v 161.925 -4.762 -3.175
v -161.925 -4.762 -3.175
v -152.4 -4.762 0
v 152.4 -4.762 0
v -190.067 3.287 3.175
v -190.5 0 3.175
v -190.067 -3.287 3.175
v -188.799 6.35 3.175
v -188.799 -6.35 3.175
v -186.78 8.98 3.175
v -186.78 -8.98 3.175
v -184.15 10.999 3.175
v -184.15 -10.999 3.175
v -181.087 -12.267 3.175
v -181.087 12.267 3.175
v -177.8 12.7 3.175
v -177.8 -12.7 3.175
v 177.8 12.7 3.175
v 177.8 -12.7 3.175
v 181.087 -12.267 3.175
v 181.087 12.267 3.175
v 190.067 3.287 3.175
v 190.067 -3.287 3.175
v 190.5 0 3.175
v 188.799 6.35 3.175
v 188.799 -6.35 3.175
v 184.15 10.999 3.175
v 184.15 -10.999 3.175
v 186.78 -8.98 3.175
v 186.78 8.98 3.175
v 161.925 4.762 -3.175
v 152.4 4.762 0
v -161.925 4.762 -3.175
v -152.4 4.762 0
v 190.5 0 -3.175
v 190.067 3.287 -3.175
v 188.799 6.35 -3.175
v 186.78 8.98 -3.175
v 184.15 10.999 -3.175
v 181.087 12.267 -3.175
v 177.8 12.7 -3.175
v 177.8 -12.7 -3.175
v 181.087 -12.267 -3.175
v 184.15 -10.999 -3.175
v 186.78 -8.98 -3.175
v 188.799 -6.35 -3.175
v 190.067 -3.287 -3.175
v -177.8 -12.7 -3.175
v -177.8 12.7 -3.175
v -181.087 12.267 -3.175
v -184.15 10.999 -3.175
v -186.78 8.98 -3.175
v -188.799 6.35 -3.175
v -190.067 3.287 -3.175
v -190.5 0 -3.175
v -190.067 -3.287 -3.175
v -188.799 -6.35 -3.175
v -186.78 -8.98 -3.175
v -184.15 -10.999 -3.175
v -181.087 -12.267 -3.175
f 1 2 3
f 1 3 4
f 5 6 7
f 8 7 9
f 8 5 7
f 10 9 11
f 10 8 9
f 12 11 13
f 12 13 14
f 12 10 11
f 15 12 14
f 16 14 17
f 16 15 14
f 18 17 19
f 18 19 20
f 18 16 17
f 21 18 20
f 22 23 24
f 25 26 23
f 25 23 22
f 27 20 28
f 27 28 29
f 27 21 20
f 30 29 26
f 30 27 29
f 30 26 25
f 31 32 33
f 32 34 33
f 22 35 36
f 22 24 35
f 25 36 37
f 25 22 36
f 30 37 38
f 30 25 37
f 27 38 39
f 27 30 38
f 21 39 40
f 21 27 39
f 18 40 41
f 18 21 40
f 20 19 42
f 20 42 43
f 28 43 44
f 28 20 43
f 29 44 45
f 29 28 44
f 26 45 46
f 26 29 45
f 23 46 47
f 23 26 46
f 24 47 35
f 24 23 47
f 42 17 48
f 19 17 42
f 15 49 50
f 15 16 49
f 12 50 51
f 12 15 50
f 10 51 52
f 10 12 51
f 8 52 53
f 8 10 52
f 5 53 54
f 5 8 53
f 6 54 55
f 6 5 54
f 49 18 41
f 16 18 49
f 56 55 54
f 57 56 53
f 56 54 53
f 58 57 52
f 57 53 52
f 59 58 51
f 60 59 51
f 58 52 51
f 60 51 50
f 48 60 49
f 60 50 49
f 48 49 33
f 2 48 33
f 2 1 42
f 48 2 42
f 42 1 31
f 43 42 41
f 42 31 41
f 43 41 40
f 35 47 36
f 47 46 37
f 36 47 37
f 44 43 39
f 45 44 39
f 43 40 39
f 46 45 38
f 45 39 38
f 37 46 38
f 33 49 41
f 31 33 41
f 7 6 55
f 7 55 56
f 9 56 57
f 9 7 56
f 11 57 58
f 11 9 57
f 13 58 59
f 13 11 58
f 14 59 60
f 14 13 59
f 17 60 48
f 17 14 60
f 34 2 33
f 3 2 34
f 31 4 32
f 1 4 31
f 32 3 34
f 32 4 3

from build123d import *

# Parameters (mm, degrees)
F1_DEPTH = 3.175
F2_W     = 9.525
F2_H     = 3.175
F3_DEPTH = 152.4
F5_DEPTH = 9.525


# Not quite as in the source:
# - a length typed as a fraction of an inch, garbled in the dataset ("3 / 203.2 mm" for 3/8 in), is restored
# - a feature names something its author has since deleted; it is built from what else it names


with BuildPart() as f1:
    # F0 (on Top) → F1 (new body, symmetric)
    with BuildSketch(Plane.XY):
        with BuildLine():
            Line((-152.4, 12.7), (-177.8, 12.7))
            ThreePointArc((-177.8, 12.7), (-186.780256, 8.980256), (-190.5, 0))
            ThreePointArc((-190.5, 0), (-186.780256, -8.980256), (-177.8, -12.7))
            Line((-177.8, -12.7), (-152.4, -12.7))
            Line((-152.4, -12.7), (152.4, -12.7))
            Line((152.4, -12.7), (177.8, -12.7))
            ThreePointArc((177.8, -12.7), (186.780256, -8.980256), (190.5, 0))
            ThreePointArc((190.5, 0), (186.780256, 8.980256), (177.8, 12.7))
            Line((177.8, 12.7), (152.4, 12.7))
            Line((152.4, 12.7), (-152.4, 12.7))
        make_face()
    extrude(amount=F1_DEPTH, both=True)

    # F2 (on Right) → F3 (cut, symmetric)
    with BuildSketch(Plane.YZ):
        with Locations((0, -1.5875)):
            Rectangle(F2_W, F2_H)
    extrude(amount=F3_DEPTH, both=True, mode=Mode.SUBTRACT)

    # F4 (on face) → F5 (cut)
    with BuildSketch(Plane(origin=(0, -4.7625, 0), x_dir=(-1, 0, 0), z_dir=(0, 1, 0))):
        Polygon((161.925, -3.175), (152.4, 0), (152.4, -3.175), align=None)
        Polygon((-152.4, -3.175), (-152.4, 0), (-161.925, -3.175), align=None)
    extrude(amount=F5_DEPTH, mode=Mode.SUBTRACT)


solid = f1.part
